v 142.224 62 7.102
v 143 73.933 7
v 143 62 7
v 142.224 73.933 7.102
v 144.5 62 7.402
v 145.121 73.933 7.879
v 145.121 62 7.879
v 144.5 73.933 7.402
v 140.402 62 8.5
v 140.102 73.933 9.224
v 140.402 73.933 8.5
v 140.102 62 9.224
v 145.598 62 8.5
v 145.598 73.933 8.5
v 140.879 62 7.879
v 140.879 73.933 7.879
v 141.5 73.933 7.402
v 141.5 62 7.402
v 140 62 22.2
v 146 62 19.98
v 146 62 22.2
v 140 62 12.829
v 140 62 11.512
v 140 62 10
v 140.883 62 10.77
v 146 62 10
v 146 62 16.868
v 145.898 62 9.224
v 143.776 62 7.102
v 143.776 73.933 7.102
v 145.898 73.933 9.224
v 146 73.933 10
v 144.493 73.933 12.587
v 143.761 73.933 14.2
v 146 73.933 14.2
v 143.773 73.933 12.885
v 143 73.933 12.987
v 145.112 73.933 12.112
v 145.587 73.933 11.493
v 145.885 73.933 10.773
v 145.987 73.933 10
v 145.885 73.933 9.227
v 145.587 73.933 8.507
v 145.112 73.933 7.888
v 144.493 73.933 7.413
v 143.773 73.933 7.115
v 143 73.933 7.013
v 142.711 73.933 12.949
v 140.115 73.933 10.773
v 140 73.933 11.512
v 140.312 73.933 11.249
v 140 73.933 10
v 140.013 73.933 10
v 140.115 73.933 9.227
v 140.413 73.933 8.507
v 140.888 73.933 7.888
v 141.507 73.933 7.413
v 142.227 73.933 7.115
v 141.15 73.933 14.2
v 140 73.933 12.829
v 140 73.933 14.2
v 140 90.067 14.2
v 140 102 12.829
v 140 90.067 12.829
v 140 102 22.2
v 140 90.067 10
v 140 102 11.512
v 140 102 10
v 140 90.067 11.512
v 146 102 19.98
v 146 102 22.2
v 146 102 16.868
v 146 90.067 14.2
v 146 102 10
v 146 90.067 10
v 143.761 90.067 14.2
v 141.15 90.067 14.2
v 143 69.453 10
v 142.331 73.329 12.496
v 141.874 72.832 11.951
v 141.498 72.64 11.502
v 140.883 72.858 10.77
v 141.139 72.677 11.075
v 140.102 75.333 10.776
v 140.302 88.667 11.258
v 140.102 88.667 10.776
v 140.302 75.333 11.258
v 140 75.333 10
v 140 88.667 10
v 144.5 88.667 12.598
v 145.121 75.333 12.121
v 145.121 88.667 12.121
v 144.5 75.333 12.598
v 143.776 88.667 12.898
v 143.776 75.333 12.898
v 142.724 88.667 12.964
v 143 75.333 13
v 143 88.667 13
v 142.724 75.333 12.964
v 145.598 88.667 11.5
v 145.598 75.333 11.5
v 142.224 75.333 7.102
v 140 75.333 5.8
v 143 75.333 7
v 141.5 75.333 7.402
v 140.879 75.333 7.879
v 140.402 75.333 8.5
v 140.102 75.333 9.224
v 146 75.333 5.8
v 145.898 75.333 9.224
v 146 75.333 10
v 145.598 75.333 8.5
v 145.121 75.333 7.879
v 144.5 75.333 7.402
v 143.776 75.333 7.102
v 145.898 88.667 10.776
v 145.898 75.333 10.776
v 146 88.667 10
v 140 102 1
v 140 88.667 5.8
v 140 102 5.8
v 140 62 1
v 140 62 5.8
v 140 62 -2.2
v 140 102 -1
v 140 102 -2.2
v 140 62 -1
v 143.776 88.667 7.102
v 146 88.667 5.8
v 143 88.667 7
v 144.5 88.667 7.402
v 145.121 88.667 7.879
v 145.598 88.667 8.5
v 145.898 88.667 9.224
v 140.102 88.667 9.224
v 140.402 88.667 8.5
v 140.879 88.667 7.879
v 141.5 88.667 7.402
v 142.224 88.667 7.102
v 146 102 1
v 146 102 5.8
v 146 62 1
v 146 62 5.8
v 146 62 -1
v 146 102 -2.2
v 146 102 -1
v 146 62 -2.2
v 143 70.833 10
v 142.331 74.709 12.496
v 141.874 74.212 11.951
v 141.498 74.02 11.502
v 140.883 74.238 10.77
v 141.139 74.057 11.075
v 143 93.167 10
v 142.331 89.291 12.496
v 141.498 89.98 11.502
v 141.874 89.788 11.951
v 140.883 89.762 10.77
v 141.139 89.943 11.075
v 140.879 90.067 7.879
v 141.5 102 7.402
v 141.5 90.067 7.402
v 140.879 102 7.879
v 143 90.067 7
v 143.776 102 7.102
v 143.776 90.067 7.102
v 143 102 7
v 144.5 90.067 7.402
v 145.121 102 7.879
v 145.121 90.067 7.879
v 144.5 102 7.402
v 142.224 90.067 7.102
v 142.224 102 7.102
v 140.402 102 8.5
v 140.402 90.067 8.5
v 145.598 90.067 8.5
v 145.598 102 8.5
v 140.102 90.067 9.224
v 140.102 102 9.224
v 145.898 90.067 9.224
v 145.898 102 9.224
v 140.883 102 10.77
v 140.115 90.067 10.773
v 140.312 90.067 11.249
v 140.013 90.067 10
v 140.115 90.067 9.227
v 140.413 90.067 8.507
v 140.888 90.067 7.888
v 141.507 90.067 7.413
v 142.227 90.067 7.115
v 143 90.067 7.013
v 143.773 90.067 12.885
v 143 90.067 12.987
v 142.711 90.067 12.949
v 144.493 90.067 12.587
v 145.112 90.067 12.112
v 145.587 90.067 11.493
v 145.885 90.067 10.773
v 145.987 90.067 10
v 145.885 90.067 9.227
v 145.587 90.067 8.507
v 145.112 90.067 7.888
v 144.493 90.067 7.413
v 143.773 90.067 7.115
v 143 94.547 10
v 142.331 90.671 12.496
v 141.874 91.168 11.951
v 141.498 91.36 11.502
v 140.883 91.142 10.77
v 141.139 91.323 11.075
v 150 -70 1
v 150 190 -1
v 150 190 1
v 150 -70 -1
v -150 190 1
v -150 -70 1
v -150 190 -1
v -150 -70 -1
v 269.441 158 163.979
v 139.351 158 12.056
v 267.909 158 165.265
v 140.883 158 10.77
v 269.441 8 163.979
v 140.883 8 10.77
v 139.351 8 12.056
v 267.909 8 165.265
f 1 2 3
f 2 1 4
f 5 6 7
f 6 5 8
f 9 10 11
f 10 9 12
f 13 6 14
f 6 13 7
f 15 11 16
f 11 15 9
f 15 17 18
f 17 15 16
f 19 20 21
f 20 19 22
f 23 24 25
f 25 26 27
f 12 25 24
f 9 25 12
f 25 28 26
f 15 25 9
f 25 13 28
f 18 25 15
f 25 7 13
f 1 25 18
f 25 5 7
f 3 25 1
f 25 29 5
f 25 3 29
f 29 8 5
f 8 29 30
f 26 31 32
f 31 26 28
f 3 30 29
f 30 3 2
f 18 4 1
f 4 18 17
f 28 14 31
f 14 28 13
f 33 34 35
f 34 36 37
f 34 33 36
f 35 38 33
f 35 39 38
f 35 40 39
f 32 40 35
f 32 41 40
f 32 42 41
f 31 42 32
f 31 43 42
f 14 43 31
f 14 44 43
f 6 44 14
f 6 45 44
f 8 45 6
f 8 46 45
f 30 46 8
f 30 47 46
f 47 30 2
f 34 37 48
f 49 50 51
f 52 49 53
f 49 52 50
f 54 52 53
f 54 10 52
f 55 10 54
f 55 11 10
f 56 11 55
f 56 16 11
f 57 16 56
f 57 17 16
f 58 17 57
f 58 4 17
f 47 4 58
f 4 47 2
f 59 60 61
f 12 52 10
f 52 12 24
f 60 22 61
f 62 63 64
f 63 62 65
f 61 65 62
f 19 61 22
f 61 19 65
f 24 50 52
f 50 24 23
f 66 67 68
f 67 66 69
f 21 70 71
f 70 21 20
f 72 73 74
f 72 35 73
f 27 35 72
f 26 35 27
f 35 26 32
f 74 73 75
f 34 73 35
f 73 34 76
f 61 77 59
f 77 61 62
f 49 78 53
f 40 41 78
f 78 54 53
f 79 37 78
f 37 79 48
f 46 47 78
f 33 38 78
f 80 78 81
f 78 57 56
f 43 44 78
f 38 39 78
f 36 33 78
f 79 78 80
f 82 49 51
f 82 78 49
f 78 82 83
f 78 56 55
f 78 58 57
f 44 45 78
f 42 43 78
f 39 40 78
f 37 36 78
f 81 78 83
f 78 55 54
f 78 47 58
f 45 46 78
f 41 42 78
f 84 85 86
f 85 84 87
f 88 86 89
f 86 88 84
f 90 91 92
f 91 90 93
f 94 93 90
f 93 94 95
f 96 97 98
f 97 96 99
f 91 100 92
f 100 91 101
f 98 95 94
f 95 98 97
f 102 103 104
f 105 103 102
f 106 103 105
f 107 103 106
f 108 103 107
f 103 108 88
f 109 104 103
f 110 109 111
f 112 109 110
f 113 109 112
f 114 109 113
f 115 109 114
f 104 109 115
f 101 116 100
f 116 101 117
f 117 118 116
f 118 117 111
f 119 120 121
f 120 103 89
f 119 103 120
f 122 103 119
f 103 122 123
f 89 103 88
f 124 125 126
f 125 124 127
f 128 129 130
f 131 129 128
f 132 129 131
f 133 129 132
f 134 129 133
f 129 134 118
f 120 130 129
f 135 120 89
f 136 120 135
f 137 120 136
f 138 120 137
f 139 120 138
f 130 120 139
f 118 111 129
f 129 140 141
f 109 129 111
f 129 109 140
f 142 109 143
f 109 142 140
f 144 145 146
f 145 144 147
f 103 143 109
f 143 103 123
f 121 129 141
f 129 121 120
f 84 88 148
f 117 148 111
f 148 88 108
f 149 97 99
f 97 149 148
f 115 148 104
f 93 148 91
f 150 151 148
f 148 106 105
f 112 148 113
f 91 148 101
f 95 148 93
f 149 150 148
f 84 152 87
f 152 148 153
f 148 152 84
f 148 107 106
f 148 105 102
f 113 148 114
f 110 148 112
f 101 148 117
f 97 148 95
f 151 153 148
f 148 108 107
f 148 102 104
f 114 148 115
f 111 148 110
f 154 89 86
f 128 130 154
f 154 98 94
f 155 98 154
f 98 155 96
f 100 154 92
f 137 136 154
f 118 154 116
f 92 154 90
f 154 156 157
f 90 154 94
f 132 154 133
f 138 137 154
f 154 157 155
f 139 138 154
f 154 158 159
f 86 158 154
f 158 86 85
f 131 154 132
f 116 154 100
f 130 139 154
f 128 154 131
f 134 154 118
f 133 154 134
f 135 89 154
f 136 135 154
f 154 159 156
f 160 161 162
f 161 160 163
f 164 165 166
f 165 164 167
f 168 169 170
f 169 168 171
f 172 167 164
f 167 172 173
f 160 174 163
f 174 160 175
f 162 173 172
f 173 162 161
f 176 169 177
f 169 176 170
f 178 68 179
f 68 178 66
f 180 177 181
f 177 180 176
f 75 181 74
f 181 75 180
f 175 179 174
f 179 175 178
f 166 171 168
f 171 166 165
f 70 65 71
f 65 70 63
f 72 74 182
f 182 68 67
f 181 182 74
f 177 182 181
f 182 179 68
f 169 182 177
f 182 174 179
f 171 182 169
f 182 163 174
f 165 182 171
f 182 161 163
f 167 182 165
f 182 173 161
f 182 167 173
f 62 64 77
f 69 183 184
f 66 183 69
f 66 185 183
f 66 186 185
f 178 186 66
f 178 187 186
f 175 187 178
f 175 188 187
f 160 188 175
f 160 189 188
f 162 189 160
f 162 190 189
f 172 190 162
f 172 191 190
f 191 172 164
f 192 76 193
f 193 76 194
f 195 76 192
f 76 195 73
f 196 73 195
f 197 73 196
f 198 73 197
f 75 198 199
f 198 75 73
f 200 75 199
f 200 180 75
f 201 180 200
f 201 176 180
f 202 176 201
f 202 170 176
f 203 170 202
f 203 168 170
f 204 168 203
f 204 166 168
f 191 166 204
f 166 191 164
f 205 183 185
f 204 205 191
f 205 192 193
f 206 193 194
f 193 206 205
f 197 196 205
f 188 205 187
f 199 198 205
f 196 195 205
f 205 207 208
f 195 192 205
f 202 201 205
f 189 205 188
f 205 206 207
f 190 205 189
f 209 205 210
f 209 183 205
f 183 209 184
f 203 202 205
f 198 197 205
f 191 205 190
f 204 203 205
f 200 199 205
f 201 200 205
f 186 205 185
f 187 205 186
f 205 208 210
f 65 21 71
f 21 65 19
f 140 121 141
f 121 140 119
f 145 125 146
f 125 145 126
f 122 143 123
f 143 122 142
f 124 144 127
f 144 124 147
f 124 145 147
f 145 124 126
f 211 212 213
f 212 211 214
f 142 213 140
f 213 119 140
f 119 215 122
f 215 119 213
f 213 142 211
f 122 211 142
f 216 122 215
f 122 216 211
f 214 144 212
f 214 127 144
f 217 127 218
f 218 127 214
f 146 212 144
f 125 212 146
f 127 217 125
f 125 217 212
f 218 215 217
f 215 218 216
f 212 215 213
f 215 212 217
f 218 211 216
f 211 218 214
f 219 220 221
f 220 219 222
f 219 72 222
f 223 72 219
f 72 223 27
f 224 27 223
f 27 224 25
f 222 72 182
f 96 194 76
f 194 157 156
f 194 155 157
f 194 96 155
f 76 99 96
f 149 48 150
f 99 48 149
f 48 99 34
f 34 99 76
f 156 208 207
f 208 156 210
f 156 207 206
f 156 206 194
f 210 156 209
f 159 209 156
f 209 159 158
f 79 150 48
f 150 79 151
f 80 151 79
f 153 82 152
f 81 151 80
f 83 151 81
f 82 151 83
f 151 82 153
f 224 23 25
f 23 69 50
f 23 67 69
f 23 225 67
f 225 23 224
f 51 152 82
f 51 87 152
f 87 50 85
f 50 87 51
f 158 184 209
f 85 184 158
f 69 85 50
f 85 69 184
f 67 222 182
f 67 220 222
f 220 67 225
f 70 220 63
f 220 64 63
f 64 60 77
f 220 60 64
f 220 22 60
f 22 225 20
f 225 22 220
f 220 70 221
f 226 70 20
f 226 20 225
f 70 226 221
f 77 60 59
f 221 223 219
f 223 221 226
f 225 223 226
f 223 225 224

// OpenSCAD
// file: mathhinge.scad
module math_hinge(){// mathgrrl cone hinge

//////////////////////////////////////////////////////
// parameters

// Length of the complete hinge
length = 20;

// Height (diameter) of the hinge
height = 3;

// Clearance between cones and holes
clearance = .7;		

// Clearance between hinge and sides
gap = .6; 				

// Parameters that the user does not get to specify
$fn=24*1;
border = 2*1; 
fudge = .01*1;			// to preserve mesh integrity
corner = 0*1;      	// space between hinge and corner
hinge_radius = height/2;
cone_height = 1.5*hinge_radius;  

//////////////////////////////////////////////////////
// renders

rotate(90,[0,1,0]) 
	translate([-hinge_radius,0,0])
		hinge();

translate([0,hinge_radius+gap,0]) bar();
translate([0,-2*border-hinge_radius-gap,0]) bar();

//translate([0,hinge_radius+gap,0]) square();
//translate([0,-length-hinge_radius-gap,0]) square();


//////////////////////////////////////////////////////
// module for hinge

module hinge(){
	rad = hinge_radius;
	clr = clearance;
	len = (length-2*corner)/3; 
	con = cone_height;
	// left outside hinge = (cylinder+box)-cone
	difference(){
		union(){
			translate([0,0,corner]) cylinder(h=len-clr,r=rad);
			translate([-rad,0,corner]) cube([2*rad,rad+gap,len-clr]);
		}
		translate([0,0,corner+len-con-clr+fudge]) cylinder(h=con,r1=0,r2=rad);
	}
	// inside hinge = cylinder+box+cone+cone
	union(){
		translate([0,0,corner+len]) cylinder(h=len,r=rad);
		translate([-rad,-rad-gap,corner+len]) cube([2*rad,rad+gap,len]);
		translate([0,0,corner+len-con]) cylinder(h=con,r1=0,r2=rad);
		translate([0,0,corner+2*len]) cylinder(h=con,r1=rad,r2=0);
	}
	// right outside hinge = (cylinder+box)-cone
	difference(){
		union(){
			translate([0,0,corner+2*len+clr]) cylinder(h=len-clr,r=rad);
			translate([-rad,0,corner+2*len+clr]) cube([2*rad,rad+gap,len-clr]);
		}
		translate([0,0,corner+2*len+clr-fudge]) cylinder(h=con,r1=rad,r2=0);	
	}
}

//////////////////////////////////////////////////////
// module for square shape

module square(){
	difference(){
		cube([length,length,height]);
		translate([border,border,-fudge])
			cube(	[length-2*border,length-2*border,height+2*fudge]);
	}
}

//////////////////////////////////////////////////////
// module for bar shape

module bar(){
	cube([length,2*border,height]);
}
}
math_hinge();
// file: hinge-lego.scad
use <mathhinge.scad>;

module hinge(){
translate([1, -10, 0]) math_hinge();
}

module box(){
	difference(){
		cube([22, 5, 4], center=true);
		translate([0,0,2]) cube([21, 3.5, 6], center=true);
	}
}


hinge();
translate([12,0,2]) box();

//for comparison
//translate([0, -5, 0]) cube([20, 4, 3]);
// main file
use <hinge-lego.scad>;

module bunny(factor){
	difference(){
		scale([factor, factor, factor])
		import("component/PlayboyBunny.stl");

		translate([-60, -110, -1])
		cube([200, 50, 50]);
	}
}


//1st base
translate([0, 60, 0]) cube([300, 260, 2], center=true);


//2nd layer
translate([160, 0, 60])rotate([0, 130, 0]) 
	translate([-150, 8, 15]) cube([200, 150, 2]);

//translate([9, 27, 19]) rotate([0, 90, 0]) scale([2, 2, 2])
	//box();


translate([140, 60, 30]) rotate([90, 0, 90]) scale([2, 2, 2])
	hinge();
